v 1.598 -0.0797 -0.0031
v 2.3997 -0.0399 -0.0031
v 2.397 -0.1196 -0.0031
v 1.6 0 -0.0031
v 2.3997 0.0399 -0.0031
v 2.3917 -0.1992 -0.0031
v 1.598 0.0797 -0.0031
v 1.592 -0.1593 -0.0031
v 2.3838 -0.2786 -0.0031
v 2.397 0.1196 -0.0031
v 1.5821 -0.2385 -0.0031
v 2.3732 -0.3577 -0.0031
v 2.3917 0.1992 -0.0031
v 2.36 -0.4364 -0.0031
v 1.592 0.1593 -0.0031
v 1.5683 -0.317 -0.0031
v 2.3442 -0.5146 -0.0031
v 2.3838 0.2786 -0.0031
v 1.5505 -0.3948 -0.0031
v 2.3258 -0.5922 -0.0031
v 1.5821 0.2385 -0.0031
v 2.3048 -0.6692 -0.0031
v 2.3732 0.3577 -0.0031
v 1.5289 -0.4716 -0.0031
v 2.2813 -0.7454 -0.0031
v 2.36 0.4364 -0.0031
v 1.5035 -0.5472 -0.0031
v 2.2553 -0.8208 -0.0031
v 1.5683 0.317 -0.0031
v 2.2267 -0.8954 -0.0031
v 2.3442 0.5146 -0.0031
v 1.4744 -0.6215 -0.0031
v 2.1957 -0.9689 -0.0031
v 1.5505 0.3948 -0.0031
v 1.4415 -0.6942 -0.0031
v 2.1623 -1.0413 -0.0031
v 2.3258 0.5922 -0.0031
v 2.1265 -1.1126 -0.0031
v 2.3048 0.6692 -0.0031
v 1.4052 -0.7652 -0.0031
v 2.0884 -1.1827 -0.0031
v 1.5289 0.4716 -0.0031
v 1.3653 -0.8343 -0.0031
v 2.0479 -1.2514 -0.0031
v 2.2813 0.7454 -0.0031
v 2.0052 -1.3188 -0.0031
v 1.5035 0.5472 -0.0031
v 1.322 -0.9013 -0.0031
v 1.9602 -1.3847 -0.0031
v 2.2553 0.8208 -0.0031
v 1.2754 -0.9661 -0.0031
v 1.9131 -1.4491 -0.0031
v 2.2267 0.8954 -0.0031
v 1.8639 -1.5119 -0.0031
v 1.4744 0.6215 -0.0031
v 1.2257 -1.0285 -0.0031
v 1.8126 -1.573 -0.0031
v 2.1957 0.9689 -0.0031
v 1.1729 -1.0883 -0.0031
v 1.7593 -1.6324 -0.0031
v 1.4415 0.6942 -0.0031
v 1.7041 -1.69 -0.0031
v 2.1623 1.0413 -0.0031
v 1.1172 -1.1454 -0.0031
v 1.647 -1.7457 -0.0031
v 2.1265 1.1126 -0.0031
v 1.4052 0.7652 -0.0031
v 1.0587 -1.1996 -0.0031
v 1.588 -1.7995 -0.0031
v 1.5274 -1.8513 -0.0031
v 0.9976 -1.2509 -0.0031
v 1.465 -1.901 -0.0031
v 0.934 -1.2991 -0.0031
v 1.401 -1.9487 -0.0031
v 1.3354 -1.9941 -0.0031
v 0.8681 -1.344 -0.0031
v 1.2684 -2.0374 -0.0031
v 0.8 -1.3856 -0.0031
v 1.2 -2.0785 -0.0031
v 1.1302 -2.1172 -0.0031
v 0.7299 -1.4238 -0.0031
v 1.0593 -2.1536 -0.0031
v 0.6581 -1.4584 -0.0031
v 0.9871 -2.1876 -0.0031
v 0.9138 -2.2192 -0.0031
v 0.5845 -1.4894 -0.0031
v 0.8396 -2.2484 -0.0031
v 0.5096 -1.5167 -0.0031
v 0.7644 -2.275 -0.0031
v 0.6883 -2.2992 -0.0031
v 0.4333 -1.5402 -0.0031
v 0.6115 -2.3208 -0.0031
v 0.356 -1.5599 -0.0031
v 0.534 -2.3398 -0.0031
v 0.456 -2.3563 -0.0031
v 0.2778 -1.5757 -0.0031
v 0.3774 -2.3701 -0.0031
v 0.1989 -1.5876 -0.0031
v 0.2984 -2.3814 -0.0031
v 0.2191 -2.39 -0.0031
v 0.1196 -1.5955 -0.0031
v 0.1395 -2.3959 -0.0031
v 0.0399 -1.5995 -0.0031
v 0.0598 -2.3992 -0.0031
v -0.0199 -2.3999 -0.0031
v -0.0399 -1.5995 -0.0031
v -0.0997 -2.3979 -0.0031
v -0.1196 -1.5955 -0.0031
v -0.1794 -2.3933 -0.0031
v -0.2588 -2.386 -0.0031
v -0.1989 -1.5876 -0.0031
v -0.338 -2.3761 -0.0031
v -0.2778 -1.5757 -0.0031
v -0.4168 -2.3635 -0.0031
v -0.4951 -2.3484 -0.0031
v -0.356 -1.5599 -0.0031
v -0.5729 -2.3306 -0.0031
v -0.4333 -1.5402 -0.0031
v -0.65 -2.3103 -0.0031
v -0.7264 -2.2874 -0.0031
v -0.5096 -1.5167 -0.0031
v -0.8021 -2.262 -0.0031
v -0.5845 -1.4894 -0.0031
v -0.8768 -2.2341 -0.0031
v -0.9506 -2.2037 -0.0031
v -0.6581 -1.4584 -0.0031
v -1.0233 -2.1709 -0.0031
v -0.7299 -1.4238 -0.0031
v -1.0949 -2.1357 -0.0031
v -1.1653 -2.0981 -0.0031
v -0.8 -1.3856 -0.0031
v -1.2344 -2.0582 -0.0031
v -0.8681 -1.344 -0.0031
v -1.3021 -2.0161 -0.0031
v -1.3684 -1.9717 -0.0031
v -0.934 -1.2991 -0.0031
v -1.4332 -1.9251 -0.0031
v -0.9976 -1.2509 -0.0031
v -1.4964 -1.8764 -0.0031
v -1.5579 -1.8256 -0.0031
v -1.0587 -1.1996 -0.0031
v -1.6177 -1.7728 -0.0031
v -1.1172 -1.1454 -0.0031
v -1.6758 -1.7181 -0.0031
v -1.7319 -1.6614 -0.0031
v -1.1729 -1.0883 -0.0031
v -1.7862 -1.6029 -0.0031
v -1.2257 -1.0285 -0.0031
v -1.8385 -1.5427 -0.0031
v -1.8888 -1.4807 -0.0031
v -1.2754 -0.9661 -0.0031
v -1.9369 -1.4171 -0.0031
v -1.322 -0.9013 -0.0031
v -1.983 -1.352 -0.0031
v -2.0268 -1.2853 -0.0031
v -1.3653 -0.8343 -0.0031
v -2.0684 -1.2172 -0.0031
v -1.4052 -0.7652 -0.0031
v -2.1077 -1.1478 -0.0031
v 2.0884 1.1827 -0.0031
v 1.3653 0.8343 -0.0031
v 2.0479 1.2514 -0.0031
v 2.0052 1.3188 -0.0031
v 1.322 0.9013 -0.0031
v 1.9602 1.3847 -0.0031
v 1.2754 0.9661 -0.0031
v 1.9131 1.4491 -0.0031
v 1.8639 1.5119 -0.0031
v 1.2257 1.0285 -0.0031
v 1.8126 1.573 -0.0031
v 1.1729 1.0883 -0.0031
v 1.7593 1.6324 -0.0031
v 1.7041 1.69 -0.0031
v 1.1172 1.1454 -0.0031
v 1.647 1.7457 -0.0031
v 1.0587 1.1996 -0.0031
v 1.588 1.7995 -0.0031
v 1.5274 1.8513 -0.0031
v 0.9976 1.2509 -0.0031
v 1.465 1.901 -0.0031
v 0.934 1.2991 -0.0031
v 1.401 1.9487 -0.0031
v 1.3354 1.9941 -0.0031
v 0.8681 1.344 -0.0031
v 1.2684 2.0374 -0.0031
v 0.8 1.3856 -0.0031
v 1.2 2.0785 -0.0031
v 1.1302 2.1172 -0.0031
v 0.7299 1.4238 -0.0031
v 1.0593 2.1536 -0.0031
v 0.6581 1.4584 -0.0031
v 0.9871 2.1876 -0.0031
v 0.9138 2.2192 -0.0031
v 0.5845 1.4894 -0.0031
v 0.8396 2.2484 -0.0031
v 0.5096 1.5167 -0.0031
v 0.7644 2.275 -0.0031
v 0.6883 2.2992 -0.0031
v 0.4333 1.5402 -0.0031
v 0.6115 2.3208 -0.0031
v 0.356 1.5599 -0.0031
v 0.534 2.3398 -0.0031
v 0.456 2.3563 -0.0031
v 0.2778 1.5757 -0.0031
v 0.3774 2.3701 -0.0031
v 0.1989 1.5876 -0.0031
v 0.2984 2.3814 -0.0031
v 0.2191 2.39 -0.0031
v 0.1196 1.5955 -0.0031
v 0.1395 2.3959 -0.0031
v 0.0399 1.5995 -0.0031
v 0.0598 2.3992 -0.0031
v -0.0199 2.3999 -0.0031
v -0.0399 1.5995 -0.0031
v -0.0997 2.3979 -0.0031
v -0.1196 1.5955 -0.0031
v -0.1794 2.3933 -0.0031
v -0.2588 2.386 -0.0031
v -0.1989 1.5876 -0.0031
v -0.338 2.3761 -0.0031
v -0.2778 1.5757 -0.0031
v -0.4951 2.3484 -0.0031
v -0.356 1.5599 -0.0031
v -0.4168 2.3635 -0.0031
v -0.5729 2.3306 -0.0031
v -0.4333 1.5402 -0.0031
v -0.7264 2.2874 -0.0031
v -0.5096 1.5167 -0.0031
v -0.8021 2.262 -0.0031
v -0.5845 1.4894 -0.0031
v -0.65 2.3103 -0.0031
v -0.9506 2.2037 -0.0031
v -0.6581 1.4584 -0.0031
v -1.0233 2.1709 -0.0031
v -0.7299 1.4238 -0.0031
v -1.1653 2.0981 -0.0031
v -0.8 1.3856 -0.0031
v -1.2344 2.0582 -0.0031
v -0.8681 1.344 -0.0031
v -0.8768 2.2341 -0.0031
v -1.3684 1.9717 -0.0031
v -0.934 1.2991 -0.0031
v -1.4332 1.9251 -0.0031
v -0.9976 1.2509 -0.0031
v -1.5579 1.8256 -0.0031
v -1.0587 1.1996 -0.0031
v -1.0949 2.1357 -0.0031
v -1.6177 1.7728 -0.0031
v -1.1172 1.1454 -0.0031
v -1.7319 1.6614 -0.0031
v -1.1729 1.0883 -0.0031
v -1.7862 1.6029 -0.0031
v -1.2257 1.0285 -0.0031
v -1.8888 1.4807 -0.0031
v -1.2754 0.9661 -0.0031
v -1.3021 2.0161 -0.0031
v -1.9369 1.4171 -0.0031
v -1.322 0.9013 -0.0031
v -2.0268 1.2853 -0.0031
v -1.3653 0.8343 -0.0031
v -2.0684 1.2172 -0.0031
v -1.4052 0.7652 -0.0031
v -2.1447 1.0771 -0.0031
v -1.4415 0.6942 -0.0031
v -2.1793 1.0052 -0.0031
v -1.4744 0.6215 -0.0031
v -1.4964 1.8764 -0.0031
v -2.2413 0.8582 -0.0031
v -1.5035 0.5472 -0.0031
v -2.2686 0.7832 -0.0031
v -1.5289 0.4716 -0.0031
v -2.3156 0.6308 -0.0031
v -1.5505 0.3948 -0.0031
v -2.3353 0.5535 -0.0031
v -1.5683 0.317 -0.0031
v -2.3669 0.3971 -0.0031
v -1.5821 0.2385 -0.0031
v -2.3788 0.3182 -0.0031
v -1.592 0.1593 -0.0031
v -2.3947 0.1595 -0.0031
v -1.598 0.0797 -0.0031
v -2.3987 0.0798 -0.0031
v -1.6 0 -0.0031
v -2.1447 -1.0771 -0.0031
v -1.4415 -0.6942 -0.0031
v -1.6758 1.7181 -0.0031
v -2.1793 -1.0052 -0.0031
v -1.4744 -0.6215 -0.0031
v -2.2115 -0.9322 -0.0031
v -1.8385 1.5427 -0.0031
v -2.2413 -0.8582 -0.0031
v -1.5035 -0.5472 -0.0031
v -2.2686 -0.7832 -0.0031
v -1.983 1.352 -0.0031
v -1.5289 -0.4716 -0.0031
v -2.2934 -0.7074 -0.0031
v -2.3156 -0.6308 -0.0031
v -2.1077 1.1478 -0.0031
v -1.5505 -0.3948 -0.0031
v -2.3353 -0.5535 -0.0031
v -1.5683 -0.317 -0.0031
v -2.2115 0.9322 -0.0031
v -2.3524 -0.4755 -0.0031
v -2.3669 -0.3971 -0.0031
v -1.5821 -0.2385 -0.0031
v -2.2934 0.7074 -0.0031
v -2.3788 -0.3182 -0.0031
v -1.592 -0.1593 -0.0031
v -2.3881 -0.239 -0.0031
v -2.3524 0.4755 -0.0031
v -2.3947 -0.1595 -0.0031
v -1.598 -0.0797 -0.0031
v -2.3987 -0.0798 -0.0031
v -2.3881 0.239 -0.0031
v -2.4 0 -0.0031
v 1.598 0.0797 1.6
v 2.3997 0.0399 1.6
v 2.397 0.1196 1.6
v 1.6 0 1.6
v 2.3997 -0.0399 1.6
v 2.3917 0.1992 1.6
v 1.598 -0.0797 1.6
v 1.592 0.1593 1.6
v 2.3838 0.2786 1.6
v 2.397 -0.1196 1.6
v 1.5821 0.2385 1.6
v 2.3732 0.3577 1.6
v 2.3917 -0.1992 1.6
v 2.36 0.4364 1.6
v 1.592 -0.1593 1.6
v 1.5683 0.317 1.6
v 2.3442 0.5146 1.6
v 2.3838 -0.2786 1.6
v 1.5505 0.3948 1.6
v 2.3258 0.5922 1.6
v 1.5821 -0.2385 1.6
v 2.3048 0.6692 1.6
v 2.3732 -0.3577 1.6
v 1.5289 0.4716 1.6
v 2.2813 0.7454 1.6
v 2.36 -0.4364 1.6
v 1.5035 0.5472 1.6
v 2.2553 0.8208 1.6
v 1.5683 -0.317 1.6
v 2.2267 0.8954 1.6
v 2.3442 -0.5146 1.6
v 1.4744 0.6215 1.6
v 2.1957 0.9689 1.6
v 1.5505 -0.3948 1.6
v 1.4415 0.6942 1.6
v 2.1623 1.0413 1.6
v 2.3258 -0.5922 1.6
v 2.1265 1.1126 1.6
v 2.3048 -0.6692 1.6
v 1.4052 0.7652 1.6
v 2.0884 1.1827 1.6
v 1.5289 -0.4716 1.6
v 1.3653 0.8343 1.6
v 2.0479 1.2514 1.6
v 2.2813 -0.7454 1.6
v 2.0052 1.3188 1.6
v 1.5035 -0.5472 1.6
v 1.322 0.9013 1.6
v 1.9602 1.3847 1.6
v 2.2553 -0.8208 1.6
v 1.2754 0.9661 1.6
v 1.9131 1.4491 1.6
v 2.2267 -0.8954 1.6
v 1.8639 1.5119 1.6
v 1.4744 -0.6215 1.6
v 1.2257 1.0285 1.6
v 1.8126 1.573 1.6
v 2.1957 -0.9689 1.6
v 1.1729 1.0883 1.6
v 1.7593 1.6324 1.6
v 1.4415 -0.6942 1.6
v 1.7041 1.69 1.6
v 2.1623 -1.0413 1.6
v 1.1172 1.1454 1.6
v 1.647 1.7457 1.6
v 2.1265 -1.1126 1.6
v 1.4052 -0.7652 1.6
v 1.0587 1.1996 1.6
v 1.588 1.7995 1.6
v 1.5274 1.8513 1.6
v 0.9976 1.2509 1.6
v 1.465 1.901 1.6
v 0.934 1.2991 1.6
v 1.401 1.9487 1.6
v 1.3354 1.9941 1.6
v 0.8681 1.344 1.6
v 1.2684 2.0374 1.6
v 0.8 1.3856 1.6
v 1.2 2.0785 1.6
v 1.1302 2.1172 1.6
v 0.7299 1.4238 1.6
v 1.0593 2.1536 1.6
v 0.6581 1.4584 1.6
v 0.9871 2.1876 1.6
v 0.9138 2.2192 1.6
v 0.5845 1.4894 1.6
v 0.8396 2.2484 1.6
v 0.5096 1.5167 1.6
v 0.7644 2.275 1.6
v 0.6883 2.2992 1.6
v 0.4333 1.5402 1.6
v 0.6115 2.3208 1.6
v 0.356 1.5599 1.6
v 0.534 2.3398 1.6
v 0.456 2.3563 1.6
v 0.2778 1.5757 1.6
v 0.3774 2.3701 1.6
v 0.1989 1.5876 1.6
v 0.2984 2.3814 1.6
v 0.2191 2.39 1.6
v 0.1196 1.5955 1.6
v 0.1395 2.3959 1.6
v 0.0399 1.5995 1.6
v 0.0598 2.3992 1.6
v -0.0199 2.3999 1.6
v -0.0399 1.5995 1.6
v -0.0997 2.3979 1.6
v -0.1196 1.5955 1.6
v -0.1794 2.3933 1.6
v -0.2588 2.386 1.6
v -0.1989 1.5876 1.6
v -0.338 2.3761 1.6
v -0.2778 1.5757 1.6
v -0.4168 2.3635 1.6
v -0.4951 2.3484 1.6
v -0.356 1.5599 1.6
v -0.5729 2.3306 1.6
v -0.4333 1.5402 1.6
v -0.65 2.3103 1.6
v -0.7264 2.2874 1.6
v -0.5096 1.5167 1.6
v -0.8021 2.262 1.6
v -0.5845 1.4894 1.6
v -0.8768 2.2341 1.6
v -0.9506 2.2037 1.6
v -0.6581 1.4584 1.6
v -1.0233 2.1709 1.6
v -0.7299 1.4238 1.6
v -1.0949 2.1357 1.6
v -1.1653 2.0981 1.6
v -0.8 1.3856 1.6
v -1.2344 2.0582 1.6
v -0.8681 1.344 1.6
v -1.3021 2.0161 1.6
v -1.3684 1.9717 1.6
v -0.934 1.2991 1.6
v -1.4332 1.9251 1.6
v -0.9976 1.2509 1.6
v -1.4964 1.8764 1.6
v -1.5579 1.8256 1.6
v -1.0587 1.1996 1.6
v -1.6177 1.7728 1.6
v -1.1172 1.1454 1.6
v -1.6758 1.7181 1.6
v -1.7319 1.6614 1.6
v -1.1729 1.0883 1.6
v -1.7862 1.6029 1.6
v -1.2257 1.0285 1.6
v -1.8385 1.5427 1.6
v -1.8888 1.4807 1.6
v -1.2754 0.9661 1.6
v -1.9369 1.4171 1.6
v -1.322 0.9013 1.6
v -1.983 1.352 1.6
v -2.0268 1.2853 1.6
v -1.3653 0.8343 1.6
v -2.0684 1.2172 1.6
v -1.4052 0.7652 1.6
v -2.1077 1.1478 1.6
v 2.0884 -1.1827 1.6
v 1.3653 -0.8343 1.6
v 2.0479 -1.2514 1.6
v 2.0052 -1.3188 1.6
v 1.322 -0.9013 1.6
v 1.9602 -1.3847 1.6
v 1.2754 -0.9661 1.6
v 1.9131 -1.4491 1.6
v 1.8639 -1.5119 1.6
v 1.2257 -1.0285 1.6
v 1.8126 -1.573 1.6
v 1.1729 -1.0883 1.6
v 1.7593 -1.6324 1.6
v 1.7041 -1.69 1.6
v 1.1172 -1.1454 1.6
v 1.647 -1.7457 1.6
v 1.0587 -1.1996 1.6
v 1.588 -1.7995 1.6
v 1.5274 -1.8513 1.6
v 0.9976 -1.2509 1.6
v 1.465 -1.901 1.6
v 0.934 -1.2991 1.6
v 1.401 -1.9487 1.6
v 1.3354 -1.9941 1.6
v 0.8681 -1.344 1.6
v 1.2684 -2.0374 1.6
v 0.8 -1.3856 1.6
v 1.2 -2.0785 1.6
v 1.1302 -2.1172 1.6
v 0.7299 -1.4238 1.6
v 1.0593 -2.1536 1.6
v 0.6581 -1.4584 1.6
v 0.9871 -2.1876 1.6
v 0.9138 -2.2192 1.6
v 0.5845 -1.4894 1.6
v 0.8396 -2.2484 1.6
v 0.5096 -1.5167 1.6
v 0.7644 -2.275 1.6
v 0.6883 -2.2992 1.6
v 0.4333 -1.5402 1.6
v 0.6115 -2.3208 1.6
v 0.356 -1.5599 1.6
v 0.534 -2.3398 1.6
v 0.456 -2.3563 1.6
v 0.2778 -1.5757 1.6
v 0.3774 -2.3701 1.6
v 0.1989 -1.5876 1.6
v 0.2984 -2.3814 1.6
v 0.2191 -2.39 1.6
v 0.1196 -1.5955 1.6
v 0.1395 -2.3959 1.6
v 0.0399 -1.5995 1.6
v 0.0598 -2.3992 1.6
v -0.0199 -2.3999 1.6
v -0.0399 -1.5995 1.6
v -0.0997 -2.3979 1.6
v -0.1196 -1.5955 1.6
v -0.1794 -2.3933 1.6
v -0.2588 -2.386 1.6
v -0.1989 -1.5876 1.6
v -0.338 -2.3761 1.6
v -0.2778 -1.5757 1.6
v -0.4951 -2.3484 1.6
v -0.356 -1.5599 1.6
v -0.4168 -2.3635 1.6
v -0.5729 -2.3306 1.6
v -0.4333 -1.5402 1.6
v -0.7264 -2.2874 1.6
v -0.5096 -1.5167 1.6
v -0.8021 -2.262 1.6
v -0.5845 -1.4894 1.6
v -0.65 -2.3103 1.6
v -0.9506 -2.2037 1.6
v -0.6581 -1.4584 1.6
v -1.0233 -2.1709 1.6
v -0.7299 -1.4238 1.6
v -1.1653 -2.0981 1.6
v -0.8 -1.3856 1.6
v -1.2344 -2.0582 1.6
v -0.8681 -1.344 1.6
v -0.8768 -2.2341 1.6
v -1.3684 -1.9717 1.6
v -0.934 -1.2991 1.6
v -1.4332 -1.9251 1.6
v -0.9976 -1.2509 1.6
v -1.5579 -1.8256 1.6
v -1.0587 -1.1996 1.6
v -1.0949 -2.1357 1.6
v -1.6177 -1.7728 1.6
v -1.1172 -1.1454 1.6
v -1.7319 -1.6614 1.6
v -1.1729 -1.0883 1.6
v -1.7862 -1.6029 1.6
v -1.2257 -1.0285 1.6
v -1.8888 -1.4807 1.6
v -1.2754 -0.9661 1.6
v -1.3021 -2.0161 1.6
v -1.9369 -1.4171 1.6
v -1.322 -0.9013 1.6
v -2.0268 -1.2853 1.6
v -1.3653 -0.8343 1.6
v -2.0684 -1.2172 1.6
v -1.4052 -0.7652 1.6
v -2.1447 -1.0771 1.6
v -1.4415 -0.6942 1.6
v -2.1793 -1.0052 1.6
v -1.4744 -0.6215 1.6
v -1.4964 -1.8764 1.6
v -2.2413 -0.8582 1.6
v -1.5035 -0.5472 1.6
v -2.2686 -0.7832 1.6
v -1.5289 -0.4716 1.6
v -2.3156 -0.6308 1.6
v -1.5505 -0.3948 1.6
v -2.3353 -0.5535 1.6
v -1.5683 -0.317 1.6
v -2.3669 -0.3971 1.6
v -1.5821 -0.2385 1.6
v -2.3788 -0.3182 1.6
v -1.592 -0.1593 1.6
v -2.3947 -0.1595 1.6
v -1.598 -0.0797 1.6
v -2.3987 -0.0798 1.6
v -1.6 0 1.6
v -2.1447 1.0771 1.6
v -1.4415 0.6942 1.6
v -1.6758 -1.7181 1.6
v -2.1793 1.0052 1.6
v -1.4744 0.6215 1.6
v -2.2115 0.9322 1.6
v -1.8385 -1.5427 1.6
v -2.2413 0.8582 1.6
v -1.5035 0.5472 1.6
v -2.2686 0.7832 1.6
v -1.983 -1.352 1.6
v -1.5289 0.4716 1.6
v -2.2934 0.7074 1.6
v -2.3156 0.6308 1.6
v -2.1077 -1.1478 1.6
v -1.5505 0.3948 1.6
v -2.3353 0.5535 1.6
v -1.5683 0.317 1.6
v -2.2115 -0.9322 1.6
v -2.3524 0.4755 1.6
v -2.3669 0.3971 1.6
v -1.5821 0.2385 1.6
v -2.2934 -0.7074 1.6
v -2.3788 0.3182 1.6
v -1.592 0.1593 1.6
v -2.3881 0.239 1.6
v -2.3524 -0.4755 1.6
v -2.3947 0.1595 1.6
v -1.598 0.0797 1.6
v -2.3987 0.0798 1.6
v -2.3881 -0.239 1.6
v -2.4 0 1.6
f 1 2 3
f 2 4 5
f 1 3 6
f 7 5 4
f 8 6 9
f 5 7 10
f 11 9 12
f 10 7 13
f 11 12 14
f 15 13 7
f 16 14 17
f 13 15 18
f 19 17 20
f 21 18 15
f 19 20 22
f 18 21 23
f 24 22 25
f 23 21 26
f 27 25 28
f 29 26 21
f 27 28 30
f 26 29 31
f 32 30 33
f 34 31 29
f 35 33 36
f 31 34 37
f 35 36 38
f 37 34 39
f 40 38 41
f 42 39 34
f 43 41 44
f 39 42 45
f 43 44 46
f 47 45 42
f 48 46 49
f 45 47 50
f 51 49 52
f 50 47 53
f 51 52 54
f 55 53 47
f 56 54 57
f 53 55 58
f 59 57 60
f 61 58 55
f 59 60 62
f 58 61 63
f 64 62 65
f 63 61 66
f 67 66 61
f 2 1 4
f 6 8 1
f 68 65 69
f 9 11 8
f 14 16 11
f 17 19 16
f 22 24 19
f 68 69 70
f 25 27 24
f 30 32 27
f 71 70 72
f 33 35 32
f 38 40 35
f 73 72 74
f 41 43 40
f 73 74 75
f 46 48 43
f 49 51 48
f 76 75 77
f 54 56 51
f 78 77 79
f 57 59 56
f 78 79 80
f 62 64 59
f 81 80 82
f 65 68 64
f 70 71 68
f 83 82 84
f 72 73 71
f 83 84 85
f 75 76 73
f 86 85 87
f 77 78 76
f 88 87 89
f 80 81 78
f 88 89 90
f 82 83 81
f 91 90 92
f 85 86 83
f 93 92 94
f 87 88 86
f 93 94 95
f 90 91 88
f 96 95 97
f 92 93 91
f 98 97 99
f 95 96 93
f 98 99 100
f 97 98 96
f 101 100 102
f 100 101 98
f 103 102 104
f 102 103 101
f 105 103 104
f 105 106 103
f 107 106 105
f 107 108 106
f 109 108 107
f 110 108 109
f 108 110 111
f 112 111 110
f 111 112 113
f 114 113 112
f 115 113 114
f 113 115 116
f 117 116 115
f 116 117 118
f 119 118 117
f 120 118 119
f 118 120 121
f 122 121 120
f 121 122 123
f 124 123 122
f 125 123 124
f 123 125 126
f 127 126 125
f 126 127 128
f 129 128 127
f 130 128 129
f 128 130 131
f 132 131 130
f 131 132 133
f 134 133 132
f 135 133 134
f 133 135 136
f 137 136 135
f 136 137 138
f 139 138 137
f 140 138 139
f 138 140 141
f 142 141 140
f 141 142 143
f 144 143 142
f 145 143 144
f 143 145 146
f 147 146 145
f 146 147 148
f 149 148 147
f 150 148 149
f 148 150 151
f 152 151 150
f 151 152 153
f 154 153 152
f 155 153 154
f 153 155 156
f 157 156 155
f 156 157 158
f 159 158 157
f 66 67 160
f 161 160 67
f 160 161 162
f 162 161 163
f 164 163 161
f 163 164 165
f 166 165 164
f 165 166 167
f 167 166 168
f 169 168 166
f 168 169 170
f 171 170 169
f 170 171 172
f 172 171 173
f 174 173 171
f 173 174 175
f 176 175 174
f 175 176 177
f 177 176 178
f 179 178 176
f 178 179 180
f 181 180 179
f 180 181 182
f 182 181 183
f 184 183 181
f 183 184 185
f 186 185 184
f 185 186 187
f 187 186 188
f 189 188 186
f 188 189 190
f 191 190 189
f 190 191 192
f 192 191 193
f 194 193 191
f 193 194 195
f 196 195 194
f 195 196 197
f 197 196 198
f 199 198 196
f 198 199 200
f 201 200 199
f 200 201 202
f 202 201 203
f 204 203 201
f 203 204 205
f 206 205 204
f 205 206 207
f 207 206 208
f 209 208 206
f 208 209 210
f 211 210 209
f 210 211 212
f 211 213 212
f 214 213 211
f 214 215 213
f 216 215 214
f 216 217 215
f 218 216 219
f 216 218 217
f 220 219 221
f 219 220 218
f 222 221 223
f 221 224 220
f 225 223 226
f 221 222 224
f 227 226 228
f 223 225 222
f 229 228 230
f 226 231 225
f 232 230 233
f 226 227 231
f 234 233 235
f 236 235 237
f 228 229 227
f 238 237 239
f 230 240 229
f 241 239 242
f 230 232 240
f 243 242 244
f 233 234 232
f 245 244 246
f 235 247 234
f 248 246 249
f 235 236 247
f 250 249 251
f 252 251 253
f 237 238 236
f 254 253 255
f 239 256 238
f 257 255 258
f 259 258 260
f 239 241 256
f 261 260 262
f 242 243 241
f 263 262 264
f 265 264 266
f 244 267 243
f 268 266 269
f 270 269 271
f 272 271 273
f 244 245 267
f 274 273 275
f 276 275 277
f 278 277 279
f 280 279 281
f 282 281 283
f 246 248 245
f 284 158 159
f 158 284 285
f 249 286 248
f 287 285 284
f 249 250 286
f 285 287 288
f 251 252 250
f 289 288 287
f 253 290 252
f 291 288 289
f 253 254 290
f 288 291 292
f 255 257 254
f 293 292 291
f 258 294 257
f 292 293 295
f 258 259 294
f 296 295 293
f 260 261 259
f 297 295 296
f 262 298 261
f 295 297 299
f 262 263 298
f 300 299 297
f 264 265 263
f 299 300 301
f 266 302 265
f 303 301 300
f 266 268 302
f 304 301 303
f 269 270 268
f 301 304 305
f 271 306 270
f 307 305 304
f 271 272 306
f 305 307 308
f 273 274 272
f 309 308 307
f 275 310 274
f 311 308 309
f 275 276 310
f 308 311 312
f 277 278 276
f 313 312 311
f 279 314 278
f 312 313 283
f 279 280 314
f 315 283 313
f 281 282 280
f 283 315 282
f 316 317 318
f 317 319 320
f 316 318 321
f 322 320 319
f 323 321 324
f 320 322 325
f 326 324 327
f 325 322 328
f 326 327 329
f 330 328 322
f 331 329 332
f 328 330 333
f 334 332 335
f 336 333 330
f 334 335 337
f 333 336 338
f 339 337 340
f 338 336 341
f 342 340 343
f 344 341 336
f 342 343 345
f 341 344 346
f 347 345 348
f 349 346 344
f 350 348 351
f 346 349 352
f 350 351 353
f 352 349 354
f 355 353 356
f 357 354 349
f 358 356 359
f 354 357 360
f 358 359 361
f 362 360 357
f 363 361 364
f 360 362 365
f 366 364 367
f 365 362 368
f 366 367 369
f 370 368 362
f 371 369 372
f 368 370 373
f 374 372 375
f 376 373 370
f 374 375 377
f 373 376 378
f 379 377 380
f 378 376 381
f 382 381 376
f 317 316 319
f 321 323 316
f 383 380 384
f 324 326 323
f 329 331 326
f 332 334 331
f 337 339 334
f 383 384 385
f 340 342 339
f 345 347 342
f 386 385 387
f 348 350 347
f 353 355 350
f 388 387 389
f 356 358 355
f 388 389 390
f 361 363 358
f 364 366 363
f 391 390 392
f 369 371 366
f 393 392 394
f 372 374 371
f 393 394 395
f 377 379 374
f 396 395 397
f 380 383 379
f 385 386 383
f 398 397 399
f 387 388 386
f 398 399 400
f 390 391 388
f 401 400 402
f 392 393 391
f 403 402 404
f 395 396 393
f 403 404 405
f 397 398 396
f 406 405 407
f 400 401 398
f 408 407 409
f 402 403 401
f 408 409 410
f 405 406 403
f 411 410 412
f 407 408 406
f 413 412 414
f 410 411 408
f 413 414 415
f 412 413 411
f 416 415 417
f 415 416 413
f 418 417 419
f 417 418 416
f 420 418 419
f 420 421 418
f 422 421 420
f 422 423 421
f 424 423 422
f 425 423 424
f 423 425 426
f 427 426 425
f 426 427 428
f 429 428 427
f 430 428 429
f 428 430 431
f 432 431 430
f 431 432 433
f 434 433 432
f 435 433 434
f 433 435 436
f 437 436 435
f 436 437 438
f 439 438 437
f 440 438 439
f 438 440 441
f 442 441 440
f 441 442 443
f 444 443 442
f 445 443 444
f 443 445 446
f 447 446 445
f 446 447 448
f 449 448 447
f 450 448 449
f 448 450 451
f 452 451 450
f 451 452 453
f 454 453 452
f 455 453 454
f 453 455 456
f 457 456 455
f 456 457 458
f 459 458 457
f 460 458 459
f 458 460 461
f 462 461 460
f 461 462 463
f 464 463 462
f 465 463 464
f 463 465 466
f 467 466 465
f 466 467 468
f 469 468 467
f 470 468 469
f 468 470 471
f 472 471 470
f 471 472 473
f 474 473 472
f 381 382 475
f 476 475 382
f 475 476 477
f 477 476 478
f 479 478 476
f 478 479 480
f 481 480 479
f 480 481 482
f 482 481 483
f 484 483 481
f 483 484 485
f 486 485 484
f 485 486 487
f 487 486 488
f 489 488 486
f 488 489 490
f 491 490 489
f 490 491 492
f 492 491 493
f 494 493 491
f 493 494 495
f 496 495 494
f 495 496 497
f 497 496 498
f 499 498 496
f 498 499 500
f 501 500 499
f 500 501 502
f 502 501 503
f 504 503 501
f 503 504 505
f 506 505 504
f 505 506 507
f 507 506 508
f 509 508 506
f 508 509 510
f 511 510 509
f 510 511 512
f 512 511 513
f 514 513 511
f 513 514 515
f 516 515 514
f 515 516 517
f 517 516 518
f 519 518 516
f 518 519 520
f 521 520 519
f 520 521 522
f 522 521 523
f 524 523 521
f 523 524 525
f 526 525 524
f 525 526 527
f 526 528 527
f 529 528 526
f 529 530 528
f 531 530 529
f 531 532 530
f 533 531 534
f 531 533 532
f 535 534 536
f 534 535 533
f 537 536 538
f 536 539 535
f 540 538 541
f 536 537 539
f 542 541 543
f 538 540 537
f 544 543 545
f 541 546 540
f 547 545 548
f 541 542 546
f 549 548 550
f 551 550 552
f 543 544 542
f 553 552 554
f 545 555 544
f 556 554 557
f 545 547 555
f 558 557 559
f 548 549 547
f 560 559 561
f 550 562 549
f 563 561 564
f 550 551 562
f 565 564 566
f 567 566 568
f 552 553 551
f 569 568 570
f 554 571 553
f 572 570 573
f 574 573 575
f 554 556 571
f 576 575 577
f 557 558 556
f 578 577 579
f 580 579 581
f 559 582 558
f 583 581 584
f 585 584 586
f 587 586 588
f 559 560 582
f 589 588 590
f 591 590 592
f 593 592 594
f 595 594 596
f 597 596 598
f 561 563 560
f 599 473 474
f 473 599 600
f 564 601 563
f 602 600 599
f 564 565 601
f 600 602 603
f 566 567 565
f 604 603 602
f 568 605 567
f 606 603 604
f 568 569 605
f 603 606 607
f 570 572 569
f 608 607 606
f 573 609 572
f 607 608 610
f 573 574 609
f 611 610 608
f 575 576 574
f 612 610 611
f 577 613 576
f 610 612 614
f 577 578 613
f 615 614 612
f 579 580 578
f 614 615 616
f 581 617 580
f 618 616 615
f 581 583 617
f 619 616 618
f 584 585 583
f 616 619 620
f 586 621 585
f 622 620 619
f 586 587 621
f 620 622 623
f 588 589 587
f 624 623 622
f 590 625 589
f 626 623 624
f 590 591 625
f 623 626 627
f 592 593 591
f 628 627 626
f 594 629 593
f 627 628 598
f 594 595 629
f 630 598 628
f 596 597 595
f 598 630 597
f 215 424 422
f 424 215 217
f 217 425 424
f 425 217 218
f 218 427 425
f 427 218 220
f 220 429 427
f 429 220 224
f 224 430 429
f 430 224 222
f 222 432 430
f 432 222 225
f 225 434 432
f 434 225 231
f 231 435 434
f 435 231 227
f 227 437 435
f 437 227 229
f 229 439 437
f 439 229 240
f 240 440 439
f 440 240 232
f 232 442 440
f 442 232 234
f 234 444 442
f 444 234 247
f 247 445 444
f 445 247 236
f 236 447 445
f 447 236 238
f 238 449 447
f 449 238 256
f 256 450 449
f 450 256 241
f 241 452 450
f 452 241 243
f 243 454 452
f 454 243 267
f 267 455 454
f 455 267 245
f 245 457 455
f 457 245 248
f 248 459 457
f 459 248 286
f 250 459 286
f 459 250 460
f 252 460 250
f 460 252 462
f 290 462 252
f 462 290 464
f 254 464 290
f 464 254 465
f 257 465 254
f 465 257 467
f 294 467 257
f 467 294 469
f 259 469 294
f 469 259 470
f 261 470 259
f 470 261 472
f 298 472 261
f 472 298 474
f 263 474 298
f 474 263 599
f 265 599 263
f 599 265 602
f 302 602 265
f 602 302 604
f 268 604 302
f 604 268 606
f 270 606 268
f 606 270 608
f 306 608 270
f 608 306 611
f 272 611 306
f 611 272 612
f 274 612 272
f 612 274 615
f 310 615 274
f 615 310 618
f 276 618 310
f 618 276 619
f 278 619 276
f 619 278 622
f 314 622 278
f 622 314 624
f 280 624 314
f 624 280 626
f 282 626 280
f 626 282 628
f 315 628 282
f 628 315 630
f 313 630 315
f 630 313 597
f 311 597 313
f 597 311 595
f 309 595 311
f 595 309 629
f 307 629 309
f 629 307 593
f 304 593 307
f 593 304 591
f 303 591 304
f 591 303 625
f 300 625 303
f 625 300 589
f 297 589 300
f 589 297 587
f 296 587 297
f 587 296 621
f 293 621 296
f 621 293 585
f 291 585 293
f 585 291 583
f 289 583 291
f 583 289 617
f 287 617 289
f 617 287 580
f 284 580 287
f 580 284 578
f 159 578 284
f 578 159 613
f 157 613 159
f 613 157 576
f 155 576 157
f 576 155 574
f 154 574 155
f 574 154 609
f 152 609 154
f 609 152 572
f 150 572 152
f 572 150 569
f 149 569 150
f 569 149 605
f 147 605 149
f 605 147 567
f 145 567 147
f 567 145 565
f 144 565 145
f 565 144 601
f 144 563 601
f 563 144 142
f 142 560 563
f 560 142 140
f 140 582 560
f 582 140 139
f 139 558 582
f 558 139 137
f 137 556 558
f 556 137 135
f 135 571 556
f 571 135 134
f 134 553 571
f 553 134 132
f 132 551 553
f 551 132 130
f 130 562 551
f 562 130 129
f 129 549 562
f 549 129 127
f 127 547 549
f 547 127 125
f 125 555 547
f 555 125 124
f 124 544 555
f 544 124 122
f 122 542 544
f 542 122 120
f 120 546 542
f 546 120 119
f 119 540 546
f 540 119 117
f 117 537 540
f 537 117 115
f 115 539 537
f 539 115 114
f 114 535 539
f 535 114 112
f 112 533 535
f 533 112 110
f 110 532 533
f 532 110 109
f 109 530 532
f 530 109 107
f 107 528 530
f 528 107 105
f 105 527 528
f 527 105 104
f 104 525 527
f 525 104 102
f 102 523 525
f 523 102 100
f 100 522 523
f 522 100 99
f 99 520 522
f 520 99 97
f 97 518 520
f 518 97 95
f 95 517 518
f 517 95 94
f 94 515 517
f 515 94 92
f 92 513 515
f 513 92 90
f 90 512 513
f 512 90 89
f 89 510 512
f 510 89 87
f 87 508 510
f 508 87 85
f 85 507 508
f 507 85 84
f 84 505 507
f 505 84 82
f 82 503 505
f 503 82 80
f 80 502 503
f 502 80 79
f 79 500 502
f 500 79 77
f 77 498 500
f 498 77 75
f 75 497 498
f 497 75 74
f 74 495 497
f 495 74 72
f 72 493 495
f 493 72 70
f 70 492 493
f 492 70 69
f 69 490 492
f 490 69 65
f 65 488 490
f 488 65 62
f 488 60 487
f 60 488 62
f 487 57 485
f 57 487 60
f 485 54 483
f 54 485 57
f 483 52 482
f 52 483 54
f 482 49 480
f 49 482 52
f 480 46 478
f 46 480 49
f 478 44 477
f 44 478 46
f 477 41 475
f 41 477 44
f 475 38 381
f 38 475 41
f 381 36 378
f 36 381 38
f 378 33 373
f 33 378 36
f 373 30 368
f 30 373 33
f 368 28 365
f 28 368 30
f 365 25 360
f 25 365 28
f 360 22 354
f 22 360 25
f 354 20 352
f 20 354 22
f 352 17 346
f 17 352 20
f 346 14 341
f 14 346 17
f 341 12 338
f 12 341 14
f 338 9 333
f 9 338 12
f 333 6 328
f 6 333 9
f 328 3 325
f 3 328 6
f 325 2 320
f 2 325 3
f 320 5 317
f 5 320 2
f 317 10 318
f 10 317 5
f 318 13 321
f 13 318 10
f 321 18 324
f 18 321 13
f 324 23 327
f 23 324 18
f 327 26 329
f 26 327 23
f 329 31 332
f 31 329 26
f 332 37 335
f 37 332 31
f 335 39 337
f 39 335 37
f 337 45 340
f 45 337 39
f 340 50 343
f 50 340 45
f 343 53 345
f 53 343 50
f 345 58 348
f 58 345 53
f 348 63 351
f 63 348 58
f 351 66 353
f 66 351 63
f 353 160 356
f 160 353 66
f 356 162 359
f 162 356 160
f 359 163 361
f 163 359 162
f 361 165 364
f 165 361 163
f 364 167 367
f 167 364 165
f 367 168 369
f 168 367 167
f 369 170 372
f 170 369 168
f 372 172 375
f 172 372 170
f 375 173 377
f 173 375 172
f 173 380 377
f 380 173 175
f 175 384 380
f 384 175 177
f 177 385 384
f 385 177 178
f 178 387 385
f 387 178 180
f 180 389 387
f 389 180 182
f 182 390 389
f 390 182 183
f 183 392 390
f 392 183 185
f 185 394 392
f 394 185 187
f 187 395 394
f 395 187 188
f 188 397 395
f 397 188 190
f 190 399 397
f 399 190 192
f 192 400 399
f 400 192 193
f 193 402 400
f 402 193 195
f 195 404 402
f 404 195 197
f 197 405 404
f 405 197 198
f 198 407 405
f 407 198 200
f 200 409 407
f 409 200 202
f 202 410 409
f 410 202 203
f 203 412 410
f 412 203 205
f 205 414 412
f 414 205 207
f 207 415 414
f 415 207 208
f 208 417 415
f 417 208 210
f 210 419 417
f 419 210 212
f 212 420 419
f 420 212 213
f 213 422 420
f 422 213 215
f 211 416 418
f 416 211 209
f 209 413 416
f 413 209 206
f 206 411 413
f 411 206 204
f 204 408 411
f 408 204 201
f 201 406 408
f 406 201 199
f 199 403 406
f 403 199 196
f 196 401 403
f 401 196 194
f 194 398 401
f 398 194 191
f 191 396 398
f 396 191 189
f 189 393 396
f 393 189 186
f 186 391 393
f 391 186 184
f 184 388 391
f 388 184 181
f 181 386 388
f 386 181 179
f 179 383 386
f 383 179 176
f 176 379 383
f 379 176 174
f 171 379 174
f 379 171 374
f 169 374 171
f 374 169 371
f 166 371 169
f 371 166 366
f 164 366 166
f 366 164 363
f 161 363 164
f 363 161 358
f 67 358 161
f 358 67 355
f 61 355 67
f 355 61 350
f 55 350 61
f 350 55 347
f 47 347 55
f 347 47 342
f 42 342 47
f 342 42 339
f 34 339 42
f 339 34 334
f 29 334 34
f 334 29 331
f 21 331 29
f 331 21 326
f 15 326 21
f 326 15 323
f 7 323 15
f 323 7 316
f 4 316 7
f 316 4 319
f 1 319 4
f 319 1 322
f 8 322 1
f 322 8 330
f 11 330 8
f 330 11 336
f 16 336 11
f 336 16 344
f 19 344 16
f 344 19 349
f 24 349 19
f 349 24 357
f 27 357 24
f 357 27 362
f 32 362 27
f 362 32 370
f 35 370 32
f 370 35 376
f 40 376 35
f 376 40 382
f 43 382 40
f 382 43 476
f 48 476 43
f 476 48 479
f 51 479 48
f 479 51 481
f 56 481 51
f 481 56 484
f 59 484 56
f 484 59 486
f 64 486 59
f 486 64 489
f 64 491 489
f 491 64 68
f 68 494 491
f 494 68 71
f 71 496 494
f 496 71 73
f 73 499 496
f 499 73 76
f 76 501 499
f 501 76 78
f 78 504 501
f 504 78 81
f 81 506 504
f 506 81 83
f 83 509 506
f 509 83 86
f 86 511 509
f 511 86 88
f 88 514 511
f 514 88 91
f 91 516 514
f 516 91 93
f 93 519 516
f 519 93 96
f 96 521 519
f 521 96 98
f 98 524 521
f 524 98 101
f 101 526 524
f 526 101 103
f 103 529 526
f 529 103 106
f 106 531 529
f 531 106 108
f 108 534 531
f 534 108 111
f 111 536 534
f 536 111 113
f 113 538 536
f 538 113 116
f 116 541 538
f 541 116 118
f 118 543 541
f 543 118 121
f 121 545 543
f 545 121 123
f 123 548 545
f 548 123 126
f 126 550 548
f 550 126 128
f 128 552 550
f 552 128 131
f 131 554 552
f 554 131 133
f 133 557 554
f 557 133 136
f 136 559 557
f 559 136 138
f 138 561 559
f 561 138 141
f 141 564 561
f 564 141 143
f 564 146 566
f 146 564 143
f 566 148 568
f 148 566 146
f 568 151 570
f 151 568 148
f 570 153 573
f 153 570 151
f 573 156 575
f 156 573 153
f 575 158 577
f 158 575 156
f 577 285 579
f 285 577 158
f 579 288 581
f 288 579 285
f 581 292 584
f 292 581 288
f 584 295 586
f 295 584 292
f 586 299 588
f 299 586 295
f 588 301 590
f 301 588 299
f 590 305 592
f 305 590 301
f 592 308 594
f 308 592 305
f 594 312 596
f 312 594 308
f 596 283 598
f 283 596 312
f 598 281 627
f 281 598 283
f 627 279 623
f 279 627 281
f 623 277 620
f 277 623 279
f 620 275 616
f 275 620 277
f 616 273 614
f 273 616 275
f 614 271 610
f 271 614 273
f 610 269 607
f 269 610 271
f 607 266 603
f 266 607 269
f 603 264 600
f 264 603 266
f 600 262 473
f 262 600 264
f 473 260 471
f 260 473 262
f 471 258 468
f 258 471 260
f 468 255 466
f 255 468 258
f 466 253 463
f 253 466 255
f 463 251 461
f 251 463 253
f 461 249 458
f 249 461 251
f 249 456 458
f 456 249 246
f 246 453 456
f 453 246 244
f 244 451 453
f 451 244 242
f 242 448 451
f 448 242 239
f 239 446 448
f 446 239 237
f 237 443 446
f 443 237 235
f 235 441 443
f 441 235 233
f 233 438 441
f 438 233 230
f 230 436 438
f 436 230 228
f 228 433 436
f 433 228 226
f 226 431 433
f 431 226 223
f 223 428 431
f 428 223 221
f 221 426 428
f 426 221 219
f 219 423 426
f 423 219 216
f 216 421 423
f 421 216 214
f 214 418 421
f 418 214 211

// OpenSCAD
use <../lib.scad>
use <3626cp89.scad>
$fa=1; $fs=0.2;
function ldraw_lib__86294(realsolid=false) = [
// 0 =Minifig Head with Red Lips Annoyed / Smiling 2-Sided Pattern (Hollow Stud)
// 0 Name: 86294.dat
// 0 Author: Howard Lande [HowardLande]
// 0 !LDRAW_ORG Part Alias UPDATE 2022-01
// 0 !LICENSE Licensed under CC BY 2.0 and CC BY 4.0 : see CAreadme.txt
// 
// 0 BFC CERTIFY CCW
  [0,"BFC","CERTIFY"],
  [0,"BFC","CCW"],
// 
// 0 !HISTORY 2016-03-26 [MMR1988] Fixed dependency
// 0 !HISTORY 2022-01-14 [PTadmin] Official Update 2022-01
// 
// 
// 1 16 0 0 0 1 0 0 0 1 0 0 0 1 3626cp89.dat
  [1,16,0,0,0,1,0,0,0,1,0,0,0,1, ldraw_lib__3626cp89(realsolid)],
];
module ldraw_lib__86294(step=0, col=false, unit=2/5, alt=false, line=0.2, solid=!$preview)
    makepoly(ldraw_lib__86294(solid), step=step, col=col, unit=unit, alt=alt, line=line, solid=solid);
ldraw_lib__86294(line=0.2);
